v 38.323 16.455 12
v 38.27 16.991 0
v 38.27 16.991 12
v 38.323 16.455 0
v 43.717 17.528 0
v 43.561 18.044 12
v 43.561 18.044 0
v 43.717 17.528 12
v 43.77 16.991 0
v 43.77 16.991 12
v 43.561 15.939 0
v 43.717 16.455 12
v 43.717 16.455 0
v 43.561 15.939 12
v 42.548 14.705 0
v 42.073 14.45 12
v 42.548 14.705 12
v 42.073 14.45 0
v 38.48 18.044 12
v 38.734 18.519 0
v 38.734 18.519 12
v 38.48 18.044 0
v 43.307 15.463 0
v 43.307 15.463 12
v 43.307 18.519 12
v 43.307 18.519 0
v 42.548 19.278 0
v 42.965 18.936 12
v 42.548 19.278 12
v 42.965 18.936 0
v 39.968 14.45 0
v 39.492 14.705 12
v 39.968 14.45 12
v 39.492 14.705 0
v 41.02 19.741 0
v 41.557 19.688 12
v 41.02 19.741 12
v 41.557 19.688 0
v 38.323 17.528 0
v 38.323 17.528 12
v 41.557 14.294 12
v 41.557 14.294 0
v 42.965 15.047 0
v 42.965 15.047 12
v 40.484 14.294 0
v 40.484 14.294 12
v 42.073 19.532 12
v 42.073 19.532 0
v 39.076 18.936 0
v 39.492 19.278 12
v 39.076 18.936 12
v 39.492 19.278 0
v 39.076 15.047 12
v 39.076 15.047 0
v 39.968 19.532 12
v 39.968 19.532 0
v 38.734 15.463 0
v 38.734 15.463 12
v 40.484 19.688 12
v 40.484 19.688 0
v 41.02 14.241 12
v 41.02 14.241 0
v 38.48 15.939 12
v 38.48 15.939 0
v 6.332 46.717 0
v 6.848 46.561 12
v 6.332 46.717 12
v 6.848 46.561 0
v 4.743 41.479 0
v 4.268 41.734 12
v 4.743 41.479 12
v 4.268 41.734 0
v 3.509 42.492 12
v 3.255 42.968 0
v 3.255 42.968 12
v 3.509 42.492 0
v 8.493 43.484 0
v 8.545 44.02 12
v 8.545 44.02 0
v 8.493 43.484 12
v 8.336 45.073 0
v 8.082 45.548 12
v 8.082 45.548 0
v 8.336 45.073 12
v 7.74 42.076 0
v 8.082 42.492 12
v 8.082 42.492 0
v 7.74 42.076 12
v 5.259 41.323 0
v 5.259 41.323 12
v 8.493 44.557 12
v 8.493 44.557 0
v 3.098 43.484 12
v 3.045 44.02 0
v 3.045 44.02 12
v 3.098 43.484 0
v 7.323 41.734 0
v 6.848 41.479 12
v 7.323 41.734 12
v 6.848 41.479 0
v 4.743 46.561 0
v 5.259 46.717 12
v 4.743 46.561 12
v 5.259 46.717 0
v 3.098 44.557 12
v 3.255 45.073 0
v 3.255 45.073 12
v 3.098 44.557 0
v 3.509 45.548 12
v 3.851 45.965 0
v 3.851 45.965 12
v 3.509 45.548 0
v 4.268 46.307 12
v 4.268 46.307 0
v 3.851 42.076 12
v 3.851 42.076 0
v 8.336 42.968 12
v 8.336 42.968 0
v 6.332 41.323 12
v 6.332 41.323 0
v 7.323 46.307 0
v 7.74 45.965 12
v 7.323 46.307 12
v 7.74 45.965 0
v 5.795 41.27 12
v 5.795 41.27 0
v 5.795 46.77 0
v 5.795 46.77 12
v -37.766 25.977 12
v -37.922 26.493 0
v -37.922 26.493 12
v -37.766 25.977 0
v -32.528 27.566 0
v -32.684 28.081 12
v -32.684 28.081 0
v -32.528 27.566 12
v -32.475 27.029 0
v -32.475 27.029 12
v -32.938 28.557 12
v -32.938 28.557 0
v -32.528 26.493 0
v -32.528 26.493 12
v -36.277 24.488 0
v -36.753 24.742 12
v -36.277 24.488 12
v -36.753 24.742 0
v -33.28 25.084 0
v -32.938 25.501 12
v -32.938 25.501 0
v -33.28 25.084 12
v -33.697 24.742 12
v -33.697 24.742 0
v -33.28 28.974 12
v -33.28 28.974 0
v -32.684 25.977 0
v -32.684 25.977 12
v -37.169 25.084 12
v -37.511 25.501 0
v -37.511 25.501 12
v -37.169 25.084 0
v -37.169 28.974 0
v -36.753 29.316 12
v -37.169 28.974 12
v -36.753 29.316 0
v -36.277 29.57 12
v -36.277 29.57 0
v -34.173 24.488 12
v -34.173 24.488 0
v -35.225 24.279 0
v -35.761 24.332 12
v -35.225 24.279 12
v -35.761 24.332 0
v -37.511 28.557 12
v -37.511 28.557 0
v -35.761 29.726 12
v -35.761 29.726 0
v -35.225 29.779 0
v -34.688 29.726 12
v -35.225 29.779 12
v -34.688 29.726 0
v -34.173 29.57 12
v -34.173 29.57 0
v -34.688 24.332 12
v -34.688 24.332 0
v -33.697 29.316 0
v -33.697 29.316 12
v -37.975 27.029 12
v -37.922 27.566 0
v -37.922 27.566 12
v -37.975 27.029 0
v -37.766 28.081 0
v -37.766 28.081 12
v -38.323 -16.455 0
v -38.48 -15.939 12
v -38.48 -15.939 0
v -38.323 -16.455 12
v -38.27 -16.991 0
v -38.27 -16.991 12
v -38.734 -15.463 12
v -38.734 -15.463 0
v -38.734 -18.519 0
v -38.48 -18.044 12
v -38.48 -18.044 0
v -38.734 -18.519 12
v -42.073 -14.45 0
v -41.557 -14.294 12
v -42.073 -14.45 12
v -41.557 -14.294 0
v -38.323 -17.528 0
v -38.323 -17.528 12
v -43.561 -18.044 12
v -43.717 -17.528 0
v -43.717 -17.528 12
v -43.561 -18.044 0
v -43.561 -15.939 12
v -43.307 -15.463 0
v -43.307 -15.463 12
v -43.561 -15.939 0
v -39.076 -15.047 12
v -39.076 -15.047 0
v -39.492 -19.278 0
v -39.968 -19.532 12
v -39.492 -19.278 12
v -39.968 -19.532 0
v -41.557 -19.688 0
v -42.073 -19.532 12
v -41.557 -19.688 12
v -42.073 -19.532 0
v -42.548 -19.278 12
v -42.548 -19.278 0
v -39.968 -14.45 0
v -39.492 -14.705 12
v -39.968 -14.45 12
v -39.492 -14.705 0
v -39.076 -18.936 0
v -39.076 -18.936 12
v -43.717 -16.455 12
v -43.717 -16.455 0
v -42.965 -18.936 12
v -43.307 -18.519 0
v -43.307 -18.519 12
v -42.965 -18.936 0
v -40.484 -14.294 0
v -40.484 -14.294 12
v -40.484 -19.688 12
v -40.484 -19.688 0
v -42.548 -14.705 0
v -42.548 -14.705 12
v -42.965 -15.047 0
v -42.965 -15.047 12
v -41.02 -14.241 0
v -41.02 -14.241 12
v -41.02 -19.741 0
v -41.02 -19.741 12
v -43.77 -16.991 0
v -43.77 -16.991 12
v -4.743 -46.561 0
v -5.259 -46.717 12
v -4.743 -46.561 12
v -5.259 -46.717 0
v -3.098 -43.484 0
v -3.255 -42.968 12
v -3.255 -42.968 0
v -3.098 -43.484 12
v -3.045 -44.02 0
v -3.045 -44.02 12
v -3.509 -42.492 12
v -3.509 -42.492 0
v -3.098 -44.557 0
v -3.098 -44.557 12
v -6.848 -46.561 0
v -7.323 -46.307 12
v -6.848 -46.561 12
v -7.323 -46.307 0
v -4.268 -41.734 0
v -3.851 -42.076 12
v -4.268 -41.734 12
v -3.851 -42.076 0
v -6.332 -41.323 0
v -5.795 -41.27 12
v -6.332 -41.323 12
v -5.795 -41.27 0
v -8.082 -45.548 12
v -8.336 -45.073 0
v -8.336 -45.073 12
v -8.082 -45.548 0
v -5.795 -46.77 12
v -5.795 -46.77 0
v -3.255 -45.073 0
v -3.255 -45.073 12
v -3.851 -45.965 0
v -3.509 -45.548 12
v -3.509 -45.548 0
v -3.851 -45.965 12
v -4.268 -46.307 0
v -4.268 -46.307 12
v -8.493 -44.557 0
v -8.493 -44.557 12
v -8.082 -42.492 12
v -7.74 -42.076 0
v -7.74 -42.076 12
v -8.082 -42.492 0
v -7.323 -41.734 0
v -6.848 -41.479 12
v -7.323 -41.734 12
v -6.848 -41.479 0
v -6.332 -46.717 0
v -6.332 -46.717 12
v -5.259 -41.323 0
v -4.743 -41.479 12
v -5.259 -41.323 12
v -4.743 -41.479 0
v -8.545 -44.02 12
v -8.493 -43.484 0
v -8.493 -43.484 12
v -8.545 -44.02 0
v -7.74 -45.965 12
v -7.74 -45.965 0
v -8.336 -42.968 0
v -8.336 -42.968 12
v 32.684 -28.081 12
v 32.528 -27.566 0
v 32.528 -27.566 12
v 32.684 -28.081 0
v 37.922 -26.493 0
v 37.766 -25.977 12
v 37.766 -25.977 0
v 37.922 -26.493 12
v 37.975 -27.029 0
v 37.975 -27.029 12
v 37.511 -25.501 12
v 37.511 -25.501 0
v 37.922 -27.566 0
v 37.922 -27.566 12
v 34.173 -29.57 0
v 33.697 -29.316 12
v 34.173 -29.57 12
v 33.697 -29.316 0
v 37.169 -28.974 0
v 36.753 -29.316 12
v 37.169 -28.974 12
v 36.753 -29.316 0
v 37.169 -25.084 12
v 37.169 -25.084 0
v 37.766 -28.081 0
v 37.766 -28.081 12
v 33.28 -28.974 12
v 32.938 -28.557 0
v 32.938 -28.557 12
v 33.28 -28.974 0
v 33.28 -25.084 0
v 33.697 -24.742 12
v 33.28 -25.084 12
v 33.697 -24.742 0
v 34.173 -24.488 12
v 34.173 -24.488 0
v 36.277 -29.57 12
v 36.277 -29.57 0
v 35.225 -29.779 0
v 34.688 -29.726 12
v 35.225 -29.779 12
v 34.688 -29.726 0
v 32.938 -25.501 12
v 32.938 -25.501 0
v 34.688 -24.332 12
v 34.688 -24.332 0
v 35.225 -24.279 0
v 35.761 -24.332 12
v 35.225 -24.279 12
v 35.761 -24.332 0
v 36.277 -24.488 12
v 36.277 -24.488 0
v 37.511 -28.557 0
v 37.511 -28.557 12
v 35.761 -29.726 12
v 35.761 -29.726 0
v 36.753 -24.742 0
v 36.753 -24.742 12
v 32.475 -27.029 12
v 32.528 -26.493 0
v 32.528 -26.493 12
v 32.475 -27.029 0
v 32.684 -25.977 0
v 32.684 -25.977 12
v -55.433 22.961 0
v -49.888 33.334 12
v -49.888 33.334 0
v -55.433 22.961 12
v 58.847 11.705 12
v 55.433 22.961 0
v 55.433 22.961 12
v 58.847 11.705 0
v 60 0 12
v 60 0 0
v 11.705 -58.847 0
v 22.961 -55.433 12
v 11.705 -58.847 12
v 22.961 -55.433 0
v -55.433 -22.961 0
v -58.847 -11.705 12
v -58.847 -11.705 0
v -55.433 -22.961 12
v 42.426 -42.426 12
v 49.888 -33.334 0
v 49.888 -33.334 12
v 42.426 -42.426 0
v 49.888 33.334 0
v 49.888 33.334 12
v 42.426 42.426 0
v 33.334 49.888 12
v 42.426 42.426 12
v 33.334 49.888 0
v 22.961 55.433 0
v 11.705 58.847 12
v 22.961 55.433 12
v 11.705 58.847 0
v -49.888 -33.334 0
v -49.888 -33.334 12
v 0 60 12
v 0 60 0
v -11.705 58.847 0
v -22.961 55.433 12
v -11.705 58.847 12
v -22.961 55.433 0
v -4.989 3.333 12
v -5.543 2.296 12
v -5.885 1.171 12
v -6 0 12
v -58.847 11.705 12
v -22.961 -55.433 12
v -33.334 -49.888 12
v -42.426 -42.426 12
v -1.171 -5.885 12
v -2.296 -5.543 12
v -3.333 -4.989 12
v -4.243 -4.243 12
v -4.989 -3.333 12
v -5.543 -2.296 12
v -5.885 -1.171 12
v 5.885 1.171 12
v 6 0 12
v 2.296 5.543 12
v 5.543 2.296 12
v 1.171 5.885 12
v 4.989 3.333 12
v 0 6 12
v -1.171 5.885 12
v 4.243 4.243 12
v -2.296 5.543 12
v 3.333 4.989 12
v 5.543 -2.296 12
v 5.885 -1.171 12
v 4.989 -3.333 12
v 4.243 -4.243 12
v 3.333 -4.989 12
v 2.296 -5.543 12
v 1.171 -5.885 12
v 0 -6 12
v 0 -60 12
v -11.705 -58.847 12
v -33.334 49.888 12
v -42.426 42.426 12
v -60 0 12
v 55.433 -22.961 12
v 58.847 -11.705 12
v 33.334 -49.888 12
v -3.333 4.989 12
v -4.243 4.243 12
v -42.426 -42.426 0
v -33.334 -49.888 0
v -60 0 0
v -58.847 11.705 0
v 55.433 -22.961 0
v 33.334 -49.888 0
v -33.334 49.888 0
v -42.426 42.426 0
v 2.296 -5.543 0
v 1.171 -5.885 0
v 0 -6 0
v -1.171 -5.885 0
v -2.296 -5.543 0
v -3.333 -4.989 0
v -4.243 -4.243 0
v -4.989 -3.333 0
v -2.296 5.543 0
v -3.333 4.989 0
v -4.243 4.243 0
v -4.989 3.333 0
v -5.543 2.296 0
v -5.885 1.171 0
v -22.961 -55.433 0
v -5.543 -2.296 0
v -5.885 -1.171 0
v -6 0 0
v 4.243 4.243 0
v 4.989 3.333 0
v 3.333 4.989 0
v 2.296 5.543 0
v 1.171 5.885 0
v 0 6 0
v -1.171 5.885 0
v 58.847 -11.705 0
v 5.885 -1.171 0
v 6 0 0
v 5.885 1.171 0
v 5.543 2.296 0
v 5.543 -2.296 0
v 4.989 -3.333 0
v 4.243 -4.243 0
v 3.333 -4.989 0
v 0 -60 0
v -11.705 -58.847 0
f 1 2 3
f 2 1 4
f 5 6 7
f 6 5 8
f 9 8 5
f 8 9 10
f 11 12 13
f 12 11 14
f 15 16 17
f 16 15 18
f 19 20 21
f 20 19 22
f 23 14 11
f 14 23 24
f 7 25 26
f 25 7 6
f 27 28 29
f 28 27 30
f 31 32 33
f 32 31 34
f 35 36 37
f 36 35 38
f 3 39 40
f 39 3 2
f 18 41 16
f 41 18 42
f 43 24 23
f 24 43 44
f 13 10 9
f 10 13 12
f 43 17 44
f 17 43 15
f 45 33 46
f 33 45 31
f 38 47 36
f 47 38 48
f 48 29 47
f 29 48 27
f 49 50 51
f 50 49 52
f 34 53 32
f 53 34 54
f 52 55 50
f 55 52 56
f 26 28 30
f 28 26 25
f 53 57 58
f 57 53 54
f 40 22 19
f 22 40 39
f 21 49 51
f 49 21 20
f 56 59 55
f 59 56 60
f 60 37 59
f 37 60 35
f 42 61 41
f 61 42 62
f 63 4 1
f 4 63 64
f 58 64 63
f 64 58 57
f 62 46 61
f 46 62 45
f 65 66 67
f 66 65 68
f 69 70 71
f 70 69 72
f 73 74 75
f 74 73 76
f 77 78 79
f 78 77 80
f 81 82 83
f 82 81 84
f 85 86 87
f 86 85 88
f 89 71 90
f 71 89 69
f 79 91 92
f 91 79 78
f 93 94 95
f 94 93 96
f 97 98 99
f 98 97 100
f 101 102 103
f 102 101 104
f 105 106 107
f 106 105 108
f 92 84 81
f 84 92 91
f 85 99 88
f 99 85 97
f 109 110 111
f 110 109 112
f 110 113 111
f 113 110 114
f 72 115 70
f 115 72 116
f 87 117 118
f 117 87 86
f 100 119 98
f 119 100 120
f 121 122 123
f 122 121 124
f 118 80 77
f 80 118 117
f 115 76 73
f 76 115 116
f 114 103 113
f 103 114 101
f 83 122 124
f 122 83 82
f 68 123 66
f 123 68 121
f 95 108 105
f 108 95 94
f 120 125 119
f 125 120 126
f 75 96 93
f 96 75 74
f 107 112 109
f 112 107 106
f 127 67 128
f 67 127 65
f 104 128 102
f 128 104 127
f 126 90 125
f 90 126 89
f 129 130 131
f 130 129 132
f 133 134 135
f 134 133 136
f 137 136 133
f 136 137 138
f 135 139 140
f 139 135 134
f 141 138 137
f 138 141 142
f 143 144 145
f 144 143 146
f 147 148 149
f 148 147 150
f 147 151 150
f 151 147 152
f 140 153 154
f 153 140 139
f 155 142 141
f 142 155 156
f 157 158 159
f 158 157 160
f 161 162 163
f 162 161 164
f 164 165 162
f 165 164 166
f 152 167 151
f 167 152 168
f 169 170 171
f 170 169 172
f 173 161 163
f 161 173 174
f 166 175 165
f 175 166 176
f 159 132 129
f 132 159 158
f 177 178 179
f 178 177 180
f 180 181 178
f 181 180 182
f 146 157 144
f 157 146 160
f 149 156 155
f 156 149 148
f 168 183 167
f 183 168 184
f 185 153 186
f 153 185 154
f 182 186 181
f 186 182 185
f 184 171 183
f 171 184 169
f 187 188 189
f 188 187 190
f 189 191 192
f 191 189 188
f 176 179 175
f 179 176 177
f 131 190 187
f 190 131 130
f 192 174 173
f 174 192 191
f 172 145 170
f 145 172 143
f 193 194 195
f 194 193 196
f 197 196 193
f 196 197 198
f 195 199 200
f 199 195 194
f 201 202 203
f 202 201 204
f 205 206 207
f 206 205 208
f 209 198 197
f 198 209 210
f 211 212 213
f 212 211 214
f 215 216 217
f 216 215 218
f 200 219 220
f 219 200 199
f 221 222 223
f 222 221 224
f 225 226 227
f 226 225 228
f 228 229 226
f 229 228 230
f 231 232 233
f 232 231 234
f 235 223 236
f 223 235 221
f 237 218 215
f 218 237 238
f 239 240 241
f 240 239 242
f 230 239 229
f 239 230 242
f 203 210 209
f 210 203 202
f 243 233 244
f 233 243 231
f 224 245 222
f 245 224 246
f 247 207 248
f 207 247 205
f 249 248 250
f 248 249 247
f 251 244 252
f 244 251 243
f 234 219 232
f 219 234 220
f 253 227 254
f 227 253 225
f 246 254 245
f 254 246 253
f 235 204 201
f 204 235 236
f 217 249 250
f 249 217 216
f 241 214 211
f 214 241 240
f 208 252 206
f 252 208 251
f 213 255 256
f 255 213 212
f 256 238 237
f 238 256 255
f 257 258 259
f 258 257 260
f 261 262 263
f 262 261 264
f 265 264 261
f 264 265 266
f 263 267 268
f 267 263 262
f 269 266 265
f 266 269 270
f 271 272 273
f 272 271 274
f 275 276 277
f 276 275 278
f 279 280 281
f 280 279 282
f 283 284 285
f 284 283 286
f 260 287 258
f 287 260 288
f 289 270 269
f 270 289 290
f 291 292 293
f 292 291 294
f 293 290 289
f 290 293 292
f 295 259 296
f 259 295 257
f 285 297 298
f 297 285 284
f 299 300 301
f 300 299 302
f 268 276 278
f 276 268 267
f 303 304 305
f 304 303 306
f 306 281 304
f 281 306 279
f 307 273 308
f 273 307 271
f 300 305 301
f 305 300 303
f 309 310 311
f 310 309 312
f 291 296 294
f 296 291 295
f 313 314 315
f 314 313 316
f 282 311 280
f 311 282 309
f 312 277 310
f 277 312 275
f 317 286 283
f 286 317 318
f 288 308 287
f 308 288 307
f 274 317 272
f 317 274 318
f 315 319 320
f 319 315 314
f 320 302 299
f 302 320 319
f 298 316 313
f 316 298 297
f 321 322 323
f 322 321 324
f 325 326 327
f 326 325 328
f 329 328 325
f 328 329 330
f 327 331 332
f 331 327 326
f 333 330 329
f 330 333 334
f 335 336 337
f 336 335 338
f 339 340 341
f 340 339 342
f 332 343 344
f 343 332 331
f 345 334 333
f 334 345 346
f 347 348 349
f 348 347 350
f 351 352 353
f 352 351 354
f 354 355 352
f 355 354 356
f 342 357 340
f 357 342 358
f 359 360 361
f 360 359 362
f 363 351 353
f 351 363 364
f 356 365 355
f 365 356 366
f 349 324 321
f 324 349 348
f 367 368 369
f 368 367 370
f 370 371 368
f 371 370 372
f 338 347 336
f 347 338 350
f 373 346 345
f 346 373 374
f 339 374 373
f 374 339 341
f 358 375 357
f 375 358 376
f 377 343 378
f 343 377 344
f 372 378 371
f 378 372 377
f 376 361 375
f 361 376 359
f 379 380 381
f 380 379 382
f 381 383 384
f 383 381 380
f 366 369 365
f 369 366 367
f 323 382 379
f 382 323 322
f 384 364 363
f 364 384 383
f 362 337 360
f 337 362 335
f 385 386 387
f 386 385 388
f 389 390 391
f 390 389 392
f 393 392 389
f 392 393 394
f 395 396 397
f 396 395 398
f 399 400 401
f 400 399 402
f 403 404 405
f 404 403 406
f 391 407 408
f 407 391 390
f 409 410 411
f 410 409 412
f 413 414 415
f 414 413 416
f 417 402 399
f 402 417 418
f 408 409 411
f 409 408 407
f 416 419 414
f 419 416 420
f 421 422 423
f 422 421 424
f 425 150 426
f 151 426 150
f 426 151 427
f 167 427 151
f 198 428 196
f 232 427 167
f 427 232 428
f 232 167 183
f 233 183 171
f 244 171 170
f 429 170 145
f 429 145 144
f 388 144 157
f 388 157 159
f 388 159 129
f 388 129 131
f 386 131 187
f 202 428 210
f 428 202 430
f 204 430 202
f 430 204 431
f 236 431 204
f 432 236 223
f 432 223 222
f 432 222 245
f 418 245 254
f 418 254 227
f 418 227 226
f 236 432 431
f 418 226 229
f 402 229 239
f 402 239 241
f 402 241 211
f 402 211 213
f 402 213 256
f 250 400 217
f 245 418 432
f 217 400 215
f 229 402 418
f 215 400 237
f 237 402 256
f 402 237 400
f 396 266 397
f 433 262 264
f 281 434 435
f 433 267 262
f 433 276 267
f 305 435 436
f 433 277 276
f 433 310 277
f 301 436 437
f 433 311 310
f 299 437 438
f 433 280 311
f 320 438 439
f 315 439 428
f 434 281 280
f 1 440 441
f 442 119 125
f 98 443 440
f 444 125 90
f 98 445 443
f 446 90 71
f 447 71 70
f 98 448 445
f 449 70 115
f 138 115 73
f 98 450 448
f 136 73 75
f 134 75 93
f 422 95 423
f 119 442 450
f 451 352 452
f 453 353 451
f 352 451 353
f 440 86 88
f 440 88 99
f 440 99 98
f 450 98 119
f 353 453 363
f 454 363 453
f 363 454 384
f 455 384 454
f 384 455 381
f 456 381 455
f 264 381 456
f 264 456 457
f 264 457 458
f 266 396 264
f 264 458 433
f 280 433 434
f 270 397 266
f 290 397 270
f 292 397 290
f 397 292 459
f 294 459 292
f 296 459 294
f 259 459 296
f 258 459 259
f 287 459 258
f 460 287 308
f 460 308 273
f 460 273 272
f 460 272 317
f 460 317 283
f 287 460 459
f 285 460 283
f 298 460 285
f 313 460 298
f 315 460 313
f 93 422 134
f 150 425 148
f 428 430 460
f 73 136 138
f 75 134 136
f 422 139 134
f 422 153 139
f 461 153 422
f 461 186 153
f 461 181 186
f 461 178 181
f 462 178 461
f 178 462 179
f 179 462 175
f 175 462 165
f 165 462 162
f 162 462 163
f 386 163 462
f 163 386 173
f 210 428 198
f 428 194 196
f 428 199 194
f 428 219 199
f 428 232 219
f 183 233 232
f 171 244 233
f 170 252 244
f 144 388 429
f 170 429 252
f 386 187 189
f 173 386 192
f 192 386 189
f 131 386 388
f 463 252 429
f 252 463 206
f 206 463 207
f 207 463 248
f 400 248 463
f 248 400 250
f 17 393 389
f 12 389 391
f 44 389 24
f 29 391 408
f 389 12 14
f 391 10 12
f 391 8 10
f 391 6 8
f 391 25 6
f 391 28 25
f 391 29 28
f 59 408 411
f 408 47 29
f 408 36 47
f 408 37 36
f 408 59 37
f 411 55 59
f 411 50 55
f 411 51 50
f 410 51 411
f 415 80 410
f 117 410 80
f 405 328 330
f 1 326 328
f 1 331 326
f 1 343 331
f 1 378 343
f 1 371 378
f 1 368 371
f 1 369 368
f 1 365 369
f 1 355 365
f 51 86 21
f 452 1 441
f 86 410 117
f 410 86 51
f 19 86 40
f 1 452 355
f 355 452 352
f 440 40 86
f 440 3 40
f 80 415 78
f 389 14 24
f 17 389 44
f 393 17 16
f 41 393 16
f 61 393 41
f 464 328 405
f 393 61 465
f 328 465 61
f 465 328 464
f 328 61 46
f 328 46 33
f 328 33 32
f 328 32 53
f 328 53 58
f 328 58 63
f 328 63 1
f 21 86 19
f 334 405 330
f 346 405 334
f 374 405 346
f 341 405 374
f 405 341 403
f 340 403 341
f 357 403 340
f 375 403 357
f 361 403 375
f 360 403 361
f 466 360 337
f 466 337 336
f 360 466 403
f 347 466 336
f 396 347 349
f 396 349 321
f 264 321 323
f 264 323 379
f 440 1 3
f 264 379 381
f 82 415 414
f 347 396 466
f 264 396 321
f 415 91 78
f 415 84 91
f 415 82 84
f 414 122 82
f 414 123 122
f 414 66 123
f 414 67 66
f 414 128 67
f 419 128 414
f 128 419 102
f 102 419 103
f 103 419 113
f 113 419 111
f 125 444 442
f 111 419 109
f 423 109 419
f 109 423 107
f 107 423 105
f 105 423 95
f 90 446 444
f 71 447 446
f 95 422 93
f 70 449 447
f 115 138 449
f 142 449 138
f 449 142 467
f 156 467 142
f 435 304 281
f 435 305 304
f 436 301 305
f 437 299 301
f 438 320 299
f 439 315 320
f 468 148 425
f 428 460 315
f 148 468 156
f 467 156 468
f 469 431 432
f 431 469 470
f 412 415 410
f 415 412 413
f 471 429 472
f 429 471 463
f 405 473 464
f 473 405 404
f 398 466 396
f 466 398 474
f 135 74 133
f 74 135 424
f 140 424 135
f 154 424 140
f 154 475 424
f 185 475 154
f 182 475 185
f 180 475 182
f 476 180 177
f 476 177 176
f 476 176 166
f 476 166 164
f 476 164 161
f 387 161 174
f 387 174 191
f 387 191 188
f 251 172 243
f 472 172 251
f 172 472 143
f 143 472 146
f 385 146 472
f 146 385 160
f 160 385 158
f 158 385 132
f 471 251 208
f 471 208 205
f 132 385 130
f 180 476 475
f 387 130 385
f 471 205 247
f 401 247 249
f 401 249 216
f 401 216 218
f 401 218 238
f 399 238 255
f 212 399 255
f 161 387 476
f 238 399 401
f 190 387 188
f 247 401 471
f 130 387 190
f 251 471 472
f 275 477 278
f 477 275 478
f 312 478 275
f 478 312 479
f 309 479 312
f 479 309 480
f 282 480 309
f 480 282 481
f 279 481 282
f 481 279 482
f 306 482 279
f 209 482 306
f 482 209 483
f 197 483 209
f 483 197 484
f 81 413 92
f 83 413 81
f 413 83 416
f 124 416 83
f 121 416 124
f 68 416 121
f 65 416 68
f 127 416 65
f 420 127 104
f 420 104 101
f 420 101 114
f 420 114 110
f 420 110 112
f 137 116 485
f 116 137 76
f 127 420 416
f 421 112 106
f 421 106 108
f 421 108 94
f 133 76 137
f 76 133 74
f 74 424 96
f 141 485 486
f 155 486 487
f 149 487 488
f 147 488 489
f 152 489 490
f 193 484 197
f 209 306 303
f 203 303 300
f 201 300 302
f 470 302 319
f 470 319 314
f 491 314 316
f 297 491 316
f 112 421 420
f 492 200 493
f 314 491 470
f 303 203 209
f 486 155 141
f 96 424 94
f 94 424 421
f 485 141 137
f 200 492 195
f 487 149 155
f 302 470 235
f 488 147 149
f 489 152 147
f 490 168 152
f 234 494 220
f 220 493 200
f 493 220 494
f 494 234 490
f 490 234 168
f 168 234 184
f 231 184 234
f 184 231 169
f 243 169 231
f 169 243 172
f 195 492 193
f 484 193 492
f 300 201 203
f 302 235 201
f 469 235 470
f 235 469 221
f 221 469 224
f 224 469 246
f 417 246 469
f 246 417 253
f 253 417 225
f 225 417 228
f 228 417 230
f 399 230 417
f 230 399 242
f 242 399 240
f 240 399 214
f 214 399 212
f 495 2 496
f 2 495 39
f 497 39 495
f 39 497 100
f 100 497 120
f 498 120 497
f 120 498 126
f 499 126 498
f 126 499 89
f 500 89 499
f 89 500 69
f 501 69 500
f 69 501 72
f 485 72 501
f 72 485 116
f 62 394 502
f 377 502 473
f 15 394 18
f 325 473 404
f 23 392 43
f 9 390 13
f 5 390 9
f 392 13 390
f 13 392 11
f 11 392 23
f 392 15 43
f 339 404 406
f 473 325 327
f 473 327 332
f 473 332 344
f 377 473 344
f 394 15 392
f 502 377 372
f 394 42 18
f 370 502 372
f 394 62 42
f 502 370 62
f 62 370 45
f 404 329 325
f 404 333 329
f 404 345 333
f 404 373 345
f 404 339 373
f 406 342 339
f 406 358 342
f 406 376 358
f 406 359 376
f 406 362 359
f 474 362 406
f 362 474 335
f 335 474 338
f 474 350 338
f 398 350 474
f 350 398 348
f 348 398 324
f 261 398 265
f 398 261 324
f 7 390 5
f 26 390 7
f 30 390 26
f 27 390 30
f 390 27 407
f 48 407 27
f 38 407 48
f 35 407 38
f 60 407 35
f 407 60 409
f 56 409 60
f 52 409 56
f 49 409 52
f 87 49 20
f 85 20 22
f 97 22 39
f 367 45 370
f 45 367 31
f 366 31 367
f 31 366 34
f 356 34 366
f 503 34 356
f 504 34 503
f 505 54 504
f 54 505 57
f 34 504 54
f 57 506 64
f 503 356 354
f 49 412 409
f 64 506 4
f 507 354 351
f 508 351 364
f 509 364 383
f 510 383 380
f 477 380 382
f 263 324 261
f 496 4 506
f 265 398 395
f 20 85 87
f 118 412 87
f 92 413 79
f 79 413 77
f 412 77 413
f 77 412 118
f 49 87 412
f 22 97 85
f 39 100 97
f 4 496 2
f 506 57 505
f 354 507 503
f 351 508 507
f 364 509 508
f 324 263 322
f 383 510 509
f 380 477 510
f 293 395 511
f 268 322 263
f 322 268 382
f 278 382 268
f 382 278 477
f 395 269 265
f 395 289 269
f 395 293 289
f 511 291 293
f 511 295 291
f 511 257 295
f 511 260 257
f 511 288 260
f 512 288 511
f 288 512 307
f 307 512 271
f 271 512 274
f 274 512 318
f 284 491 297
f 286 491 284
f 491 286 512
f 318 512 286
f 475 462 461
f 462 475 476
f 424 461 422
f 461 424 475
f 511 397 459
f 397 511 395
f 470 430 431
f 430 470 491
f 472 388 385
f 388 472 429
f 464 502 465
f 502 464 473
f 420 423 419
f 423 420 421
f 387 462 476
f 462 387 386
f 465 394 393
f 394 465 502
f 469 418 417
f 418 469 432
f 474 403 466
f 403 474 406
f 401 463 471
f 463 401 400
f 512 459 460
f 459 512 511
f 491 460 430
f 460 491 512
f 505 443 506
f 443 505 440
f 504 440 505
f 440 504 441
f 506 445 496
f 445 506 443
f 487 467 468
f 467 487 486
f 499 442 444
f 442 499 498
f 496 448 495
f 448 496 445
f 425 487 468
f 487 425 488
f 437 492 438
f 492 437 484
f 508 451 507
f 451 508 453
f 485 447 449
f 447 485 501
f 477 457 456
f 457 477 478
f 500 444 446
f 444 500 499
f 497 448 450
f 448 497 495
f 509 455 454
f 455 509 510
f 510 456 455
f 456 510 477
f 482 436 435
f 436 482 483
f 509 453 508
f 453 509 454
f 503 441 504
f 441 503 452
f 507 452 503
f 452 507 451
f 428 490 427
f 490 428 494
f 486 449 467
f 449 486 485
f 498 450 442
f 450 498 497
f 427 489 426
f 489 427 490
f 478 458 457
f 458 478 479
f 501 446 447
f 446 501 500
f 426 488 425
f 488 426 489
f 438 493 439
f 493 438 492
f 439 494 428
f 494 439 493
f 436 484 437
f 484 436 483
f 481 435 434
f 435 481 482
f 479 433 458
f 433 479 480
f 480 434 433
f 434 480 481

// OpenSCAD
$fn = 32;

// ----------------------------------------------------------------------
// Flange Ø120 x 12
// 6 holes on a Ø88.8 bolt circle, bolted joints
// ----------------------------------------------------------------------

// --- parameters (mm) ---
flange_d = 120;    // outside diameter of the flange
thickness = 12;    // flange thickness
holes = 6;         // number of bolt holes
pcd = 88.8;        // bolt circle diameter
start_deg = 22.5;  // angle of the first hole, from +X
hole_d = 5.5;      // bolt hole diameter
bore_d = 12;       // central through bore
hub_d = 22;        // hub outside diameter
hub_h = 0;         // hub height above the flange face (0 = no hub)

// --- derived feature positions (mm) ---
height = thickness + hub_h;  // = 12   overall height of the part
pcd_r = pcd / 2;             // = 44.4   bolt circle radius
hole_step = 360 / holes;     // = 60   angular pitch
feature_centers = [
  [pcd_r * cos(start_deg + 0 * hole_step), pcd_r * sin(start_deg + 0 * hole_step)],
  [pcd_r * cos(start_deg + 1 * hole_step), pcd_r * sin(start_deg + 1 * hole_step)],
  [pcd_r * cos(start_deg + 2 * hole_step), pcd_r * sin(start_deg + 2 * hole_step)],
  [pcd_r * cos(start_deg + 3 * hole_step), pcd_r * sin(start_deg + 3 * hole_step)],
  [pcd_r * cos(start_deg + 4 * hole_step), pcd_r * sin(start_deg + 4 * hole_step)],
  [pcd_r * cos(start_deg + 5 * hole_step), pcd_r * sin(start_deg + 5 * hole_step)]
];   // bolt hole centres on the pitch circle

// flange disc, every hole and the bore cut straight through
difference() {
  union() {
    cylinder(d = flange_d, h = thickness);
  }
  translate([0, 0, -1]) cylinder(d = bore_d, h = height + 2);  // bore, through
  for (centre = feature_centers)
    translate([centre[0], centre[1], -1]) cylinder(d = hole_d, h = thickness + 2);
}
